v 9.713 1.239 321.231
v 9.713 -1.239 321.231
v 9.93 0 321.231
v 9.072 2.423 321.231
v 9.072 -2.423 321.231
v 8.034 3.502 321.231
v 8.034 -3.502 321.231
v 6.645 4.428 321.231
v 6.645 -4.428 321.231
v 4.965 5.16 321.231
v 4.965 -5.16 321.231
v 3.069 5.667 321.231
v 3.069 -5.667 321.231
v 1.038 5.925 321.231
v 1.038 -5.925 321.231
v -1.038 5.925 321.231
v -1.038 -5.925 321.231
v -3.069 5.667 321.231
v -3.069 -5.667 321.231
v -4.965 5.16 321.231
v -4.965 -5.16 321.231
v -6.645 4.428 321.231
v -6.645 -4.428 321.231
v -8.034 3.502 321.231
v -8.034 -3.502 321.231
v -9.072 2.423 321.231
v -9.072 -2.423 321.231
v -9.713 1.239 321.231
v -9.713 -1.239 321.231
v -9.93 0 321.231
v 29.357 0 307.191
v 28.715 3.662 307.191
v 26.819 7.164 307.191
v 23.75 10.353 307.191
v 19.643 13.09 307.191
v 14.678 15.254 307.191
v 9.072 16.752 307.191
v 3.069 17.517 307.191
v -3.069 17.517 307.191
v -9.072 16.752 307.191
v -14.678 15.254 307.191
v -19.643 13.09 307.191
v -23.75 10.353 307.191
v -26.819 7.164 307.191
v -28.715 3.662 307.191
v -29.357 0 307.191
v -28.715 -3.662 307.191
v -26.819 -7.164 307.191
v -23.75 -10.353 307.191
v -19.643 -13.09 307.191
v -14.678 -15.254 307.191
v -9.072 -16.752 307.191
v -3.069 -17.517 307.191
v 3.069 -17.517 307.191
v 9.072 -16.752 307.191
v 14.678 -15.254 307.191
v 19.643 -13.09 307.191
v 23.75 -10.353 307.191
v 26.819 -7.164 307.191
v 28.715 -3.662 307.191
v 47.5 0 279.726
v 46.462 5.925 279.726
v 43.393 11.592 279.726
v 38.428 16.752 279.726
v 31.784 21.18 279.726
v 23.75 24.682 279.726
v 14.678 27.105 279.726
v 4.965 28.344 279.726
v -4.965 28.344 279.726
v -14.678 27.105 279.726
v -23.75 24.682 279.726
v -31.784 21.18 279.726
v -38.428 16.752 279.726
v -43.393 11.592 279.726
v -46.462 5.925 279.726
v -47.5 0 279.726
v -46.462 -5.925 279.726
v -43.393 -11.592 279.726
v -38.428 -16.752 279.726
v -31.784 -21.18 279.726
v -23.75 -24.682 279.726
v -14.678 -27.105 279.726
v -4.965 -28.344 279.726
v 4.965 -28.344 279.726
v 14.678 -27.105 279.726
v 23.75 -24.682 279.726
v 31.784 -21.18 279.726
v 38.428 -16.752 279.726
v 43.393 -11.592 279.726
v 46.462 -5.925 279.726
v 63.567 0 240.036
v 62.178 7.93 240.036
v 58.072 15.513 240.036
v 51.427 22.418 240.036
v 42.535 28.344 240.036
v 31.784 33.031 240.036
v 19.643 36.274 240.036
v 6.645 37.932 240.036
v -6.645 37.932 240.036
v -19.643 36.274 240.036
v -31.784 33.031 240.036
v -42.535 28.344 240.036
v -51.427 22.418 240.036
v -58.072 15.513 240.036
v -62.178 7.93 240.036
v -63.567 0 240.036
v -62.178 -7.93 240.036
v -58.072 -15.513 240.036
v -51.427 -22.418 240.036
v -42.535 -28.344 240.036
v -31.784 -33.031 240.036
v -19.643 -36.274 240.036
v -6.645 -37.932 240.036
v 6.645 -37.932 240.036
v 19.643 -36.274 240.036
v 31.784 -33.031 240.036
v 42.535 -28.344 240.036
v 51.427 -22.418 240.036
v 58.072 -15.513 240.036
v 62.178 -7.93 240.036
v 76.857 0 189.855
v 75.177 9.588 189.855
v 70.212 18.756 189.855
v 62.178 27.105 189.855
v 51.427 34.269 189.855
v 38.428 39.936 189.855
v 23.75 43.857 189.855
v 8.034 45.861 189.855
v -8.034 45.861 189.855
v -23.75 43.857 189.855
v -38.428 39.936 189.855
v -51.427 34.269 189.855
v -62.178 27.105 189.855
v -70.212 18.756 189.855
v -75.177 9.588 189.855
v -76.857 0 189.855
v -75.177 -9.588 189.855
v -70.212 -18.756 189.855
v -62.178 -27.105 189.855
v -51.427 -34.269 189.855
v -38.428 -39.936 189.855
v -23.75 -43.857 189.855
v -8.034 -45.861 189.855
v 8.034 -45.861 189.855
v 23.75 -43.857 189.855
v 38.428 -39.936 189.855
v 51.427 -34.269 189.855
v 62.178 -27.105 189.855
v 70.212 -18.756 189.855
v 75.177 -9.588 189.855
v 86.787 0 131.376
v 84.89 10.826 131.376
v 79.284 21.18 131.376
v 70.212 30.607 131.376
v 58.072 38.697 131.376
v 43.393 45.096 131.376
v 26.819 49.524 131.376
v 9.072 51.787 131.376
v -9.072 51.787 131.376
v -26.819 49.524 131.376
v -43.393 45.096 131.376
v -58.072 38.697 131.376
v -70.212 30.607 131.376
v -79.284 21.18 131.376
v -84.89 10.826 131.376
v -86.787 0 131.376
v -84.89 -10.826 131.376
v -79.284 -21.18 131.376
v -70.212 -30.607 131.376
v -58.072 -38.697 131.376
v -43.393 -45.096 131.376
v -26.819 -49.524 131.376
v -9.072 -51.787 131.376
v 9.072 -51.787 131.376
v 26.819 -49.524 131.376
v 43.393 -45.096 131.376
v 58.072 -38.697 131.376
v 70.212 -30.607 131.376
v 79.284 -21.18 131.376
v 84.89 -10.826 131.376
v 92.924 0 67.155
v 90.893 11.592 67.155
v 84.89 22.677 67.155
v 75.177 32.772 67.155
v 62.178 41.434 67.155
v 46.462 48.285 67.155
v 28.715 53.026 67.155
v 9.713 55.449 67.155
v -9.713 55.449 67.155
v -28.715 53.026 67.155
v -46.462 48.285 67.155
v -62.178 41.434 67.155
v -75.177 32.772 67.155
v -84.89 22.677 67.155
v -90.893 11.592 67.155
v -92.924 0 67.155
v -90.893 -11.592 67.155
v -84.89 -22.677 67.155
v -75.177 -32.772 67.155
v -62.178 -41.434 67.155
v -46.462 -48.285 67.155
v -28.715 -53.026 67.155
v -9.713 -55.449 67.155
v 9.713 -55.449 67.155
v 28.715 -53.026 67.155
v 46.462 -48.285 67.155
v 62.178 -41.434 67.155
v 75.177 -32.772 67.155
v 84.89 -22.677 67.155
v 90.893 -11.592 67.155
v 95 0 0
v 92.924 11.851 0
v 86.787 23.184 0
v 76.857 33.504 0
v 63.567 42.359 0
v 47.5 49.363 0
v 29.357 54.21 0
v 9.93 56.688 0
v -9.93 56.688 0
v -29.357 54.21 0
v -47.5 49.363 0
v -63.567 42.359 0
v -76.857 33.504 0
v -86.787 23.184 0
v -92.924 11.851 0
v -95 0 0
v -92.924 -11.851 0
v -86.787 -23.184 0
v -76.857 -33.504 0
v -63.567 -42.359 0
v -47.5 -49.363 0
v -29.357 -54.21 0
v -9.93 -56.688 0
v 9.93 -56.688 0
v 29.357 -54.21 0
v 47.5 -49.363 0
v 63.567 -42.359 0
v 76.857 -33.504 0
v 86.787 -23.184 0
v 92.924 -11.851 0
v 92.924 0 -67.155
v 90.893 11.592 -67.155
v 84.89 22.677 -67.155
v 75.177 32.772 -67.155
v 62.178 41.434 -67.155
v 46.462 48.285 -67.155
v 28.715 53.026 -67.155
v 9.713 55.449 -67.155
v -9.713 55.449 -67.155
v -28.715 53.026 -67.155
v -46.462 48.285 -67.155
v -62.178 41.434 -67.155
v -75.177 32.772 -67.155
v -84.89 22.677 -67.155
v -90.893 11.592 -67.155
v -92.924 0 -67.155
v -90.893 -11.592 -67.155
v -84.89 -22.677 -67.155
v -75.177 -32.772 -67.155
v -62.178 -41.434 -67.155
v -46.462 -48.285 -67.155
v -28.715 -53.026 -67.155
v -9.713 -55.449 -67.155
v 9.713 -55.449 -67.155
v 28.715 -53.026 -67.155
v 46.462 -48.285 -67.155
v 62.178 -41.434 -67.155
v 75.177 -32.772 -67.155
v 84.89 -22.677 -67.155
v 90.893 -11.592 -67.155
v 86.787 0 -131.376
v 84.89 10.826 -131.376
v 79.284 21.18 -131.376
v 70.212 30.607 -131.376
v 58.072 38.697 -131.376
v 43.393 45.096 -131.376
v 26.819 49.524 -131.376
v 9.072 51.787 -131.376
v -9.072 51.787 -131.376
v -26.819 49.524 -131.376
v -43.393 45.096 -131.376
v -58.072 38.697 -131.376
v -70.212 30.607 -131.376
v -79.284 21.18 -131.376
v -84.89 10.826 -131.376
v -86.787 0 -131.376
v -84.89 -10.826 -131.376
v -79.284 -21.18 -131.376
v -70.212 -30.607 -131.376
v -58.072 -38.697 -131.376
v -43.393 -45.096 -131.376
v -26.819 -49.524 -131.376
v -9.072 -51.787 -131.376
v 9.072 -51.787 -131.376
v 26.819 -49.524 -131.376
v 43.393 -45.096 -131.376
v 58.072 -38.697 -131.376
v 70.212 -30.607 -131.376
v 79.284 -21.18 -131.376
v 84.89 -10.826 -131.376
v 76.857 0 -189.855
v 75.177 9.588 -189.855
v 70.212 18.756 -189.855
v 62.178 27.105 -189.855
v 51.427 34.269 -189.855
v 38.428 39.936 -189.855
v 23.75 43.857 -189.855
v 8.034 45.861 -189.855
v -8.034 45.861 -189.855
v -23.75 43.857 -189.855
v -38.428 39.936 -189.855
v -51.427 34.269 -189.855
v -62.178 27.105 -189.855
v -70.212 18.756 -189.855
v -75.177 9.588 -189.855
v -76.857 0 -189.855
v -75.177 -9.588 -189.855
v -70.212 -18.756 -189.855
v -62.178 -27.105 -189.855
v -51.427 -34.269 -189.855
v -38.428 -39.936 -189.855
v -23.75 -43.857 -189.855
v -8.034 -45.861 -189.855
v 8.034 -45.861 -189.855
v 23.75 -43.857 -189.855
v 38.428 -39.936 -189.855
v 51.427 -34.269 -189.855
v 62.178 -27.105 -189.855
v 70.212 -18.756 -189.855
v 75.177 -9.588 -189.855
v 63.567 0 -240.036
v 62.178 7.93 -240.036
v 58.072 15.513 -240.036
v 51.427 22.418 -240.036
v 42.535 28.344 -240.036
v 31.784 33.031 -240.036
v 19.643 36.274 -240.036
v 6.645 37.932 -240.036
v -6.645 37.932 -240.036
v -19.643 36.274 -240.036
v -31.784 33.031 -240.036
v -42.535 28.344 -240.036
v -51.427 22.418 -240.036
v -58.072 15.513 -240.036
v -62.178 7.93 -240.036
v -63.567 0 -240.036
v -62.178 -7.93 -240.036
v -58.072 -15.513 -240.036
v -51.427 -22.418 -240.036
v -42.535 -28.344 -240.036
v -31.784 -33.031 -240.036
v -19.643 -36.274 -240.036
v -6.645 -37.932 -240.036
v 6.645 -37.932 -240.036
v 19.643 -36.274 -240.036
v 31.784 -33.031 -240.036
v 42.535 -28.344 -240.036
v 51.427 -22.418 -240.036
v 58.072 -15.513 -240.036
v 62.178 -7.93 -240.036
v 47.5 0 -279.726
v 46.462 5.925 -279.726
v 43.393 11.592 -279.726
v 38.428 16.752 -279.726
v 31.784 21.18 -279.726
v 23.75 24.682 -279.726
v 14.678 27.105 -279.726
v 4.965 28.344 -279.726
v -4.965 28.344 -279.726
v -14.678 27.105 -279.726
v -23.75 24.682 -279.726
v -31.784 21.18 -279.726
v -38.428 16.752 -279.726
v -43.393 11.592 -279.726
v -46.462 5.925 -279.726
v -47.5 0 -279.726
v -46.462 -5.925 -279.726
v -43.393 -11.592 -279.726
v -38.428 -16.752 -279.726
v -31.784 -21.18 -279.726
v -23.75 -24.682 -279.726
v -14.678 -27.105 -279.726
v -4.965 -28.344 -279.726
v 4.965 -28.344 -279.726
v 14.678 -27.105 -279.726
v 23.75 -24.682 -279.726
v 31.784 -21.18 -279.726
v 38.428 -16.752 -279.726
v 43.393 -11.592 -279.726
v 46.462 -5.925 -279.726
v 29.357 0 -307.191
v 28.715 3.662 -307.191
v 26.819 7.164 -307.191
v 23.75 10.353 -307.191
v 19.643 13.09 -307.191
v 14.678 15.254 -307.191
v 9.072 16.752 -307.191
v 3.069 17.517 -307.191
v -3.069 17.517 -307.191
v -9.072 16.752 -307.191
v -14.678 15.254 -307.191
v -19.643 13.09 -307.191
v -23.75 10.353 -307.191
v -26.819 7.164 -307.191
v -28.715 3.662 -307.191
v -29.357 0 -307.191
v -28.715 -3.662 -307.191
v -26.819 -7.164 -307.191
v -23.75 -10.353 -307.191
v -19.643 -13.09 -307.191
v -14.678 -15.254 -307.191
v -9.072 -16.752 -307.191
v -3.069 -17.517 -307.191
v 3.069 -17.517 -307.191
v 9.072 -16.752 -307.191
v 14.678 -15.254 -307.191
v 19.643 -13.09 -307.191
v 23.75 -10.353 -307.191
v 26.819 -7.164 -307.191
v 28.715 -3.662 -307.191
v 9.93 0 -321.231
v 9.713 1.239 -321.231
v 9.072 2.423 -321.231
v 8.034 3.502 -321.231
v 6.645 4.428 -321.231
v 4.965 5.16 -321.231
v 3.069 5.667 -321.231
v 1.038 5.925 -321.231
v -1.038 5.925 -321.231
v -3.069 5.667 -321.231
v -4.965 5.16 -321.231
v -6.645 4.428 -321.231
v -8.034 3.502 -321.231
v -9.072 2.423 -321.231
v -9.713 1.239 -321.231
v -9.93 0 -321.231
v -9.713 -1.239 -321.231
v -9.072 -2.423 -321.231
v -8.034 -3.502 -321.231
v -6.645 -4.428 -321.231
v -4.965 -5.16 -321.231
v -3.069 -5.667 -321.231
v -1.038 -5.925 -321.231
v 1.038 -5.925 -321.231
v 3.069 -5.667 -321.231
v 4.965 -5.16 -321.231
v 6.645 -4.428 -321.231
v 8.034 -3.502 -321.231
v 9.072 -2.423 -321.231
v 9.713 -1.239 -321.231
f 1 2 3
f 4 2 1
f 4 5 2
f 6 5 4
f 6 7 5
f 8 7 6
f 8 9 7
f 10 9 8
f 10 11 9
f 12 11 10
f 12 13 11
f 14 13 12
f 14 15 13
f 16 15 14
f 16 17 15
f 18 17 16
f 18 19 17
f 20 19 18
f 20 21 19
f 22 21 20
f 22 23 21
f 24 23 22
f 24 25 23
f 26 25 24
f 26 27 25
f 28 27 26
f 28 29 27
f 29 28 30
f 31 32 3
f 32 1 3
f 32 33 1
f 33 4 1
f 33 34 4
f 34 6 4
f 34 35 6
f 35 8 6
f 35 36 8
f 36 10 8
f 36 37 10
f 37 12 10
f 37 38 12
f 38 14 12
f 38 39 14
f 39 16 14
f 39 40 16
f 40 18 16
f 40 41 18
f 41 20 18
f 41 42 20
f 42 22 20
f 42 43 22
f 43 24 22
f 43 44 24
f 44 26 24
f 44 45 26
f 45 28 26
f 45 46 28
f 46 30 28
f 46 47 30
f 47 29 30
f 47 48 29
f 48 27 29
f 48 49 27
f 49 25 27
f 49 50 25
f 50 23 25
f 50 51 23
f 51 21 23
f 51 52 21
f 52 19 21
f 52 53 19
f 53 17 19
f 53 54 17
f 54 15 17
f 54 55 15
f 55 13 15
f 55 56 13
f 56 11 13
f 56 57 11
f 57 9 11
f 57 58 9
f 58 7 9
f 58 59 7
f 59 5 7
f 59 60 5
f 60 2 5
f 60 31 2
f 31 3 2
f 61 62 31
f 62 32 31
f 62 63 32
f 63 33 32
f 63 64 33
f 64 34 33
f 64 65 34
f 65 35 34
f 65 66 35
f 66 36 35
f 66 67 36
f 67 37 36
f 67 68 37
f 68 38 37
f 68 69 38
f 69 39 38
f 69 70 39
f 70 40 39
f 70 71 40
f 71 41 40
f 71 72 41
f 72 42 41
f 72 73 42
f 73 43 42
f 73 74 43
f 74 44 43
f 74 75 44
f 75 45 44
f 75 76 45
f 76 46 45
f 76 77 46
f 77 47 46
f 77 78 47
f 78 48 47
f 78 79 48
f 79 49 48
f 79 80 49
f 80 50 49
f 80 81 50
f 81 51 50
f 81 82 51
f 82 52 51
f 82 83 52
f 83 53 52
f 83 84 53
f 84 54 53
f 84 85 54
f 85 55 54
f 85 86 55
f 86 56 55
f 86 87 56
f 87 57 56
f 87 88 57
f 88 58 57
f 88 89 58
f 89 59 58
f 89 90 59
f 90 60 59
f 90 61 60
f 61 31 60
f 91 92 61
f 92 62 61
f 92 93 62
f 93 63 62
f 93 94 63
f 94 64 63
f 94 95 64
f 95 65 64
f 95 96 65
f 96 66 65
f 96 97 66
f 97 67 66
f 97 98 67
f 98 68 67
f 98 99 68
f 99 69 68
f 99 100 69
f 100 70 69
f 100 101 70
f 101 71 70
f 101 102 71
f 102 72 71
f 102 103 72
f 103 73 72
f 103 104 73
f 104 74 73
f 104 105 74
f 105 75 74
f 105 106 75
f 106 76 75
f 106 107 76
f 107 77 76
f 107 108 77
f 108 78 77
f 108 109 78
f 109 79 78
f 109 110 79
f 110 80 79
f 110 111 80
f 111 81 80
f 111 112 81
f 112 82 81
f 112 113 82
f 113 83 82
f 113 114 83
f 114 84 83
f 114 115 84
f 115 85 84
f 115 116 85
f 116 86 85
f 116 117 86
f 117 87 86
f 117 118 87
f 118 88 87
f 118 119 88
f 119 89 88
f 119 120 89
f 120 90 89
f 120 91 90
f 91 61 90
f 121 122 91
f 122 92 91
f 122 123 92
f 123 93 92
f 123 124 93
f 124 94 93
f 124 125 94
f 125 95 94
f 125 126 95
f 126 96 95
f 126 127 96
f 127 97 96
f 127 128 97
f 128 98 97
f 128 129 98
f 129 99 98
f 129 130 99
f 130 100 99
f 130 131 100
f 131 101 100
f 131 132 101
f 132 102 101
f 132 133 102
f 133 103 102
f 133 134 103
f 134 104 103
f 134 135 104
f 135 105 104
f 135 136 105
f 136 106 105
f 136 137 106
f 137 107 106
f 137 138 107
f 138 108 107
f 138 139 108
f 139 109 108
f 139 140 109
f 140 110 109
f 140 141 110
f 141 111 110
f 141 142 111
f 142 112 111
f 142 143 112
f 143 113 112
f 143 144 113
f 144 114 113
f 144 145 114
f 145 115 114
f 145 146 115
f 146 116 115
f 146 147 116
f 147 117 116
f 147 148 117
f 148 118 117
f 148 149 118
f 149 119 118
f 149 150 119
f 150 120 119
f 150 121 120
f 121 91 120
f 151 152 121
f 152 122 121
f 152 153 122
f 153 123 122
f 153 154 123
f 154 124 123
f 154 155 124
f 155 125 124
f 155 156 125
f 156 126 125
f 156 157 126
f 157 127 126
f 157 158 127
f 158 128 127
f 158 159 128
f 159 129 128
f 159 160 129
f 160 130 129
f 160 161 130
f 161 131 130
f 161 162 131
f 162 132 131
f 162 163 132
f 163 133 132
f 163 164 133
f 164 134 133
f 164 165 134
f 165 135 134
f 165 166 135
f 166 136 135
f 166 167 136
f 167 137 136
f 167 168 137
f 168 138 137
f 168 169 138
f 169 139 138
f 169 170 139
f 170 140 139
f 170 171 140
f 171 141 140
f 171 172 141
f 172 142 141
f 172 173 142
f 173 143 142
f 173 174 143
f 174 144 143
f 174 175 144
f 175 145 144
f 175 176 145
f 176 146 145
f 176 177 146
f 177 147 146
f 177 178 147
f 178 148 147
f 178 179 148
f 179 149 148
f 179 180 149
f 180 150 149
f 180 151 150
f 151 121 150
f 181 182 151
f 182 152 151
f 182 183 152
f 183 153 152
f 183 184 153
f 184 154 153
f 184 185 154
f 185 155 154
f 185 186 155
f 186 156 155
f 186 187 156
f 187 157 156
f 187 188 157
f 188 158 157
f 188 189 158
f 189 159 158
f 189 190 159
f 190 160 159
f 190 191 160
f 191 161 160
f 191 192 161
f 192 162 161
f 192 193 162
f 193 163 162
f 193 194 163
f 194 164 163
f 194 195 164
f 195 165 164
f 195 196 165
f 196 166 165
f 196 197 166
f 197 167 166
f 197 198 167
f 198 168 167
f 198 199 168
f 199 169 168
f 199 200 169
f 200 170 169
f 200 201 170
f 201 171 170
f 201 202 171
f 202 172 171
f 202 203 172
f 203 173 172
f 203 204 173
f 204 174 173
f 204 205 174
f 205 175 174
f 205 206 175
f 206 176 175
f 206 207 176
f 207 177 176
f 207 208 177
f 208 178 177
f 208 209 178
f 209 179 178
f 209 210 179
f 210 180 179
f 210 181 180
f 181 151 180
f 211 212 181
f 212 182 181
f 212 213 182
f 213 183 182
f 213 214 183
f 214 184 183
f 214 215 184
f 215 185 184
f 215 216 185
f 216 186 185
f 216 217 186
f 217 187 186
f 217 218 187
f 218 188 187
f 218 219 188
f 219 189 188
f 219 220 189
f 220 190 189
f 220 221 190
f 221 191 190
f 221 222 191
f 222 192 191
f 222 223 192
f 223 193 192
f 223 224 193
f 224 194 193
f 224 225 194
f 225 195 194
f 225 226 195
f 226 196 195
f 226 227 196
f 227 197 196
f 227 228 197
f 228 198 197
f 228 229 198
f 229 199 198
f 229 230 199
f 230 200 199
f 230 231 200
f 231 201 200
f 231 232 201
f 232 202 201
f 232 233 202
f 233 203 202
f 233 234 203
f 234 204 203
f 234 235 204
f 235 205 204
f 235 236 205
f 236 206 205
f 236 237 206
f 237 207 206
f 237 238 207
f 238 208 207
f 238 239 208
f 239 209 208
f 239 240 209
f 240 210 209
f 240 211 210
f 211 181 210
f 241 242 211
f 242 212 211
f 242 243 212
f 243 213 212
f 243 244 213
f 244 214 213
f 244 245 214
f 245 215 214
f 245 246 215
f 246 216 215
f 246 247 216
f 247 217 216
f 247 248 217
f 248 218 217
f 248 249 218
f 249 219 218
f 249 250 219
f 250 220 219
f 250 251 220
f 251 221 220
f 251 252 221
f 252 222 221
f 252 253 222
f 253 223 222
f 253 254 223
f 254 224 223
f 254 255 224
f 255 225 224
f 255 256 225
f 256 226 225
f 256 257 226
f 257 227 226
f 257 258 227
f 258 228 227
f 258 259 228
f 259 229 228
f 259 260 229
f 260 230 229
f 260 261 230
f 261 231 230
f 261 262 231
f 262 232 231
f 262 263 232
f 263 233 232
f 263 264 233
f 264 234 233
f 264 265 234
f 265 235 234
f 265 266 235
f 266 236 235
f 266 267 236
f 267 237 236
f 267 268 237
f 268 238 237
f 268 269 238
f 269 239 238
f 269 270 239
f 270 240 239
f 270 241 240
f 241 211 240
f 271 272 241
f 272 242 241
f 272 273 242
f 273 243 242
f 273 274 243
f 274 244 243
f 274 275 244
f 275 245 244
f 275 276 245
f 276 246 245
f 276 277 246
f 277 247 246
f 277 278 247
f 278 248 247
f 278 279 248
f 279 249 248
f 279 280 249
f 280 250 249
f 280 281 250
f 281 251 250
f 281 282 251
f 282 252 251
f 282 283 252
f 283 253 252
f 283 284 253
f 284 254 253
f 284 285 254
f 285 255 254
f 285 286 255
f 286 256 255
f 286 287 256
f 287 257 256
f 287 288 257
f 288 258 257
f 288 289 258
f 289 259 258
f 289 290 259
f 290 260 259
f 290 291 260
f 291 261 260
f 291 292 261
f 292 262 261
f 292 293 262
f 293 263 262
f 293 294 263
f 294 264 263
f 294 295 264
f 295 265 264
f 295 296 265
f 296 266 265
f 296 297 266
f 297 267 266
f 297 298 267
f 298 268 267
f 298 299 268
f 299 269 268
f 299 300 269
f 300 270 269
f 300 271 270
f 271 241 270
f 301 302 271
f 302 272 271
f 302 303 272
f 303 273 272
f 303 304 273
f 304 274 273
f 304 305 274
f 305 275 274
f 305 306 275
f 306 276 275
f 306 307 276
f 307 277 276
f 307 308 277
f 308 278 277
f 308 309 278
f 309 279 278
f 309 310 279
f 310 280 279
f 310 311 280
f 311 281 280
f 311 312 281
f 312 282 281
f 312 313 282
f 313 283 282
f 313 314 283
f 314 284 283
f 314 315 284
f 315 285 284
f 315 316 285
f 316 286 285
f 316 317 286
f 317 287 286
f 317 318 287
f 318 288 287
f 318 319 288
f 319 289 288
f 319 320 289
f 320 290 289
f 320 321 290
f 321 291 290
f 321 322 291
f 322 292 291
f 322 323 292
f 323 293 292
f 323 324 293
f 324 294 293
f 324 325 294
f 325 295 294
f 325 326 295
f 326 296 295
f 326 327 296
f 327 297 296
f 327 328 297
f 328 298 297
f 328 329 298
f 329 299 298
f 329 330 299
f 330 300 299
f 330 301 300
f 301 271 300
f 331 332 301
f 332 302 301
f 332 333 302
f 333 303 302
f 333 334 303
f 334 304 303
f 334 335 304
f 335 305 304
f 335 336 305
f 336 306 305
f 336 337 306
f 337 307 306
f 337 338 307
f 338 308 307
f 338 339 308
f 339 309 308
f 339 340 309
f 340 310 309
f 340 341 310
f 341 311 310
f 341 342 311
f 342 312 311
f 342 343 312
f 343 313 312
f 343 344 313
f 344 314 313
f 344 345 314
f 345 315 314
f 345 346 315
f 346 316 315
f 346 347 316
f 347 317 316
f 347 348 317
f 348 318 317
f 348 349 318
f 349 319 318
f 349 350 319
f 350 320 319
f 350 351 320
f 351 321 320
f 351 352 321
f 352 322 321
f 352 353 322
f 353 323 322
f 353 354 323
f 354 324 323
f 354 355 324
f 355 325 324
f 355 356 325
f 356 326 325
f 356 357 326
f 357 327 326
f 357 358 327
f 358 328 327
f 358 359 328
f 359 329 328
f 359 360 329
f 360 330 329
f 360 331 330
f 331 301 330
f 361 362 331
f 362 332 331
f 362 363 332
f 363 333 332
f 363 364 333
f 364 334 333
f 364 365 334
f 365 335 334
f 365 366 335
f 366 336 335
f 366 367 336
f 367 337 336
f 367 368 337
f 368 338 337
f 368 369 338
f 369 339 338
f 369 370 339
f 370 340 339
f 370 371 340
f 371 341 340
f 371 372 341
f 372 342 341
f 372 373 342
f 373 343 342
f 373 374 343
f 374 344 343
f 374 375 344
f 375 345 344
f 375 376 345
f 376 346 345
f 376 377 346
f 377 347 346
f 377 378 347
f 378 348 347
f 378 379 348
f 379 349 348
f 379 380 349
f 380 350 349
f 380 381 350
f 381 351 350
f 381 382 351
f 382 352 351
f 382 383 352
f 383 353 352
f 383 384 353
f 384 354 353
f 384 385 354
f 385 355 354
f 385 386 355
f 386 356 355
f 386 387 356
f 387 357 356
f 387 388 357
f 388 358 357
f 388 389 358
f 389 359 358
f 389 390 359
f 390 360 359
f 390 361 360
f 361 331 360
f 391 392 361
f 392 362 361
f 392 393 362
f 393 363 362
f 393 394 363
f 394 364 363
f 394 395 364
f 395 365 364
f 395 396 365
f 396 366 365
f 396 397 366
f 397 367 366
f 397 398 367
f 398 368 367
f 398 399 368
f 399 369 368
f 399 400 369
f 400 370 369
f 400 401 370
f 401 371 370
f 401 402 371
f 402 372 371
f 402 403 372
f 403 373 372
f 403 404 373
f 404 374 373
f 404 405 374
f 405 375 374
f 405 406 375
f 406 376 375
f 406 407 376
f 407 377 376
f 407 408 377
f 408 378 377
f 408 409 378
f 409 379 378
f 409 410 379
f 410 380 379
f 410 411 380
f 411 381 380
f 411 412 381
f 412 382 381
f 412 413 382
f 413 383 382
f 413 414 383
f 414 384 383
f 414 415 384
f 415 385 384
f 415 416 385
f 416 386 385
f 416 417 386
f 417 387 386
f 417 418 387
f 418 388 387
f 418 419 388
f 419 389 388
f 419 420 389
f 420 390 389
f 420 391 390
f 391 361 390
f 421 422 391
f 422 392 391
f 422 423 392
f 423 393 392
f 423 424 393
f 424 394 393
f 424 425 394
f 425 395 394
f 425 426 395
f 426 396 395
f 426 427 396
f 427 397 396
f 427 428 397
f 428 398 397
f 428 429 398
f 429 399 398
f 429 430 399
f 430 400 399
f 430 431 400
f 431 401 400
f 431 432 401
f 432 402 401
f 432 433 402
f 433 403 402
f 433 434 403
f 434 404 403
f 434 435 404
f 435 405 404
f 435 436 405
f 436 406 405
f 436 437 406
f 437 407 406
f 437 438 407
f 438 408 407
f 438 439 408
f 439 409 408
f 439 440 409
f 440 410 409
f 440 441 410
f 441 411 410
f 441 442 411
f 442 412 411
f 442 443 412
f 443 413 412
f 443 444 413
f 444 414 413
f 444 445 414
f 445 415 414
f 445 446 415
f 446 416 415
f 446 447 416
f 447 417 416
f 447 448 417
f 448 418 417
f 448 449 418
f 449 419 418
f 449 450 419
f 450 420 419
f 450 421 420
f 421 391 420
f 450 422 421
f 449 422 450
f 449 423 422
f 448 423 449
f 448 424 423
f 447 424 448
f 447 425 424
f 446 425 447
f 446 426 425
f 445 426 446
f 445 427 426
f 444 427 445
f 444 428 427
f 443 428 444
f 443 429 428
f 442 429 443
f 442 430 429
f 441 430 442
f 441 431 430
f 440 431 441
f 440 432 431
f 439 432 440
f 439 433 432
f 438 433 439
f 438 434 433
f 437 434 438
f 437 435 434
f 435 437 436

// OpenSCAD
// Generated by SolidPython 1.0.1 on 2020-07-29 00:46:46


scale(v = [5, 3, 17]) {
	sphere(r = 19);
}
/***********************************************
*********      SolidPython code:      **********
************************************************
 
# import packages: SolidPython
from solid import *
from solid.utils import *
from itertools import chain, combinations, permutations


class Resize:

    def __init__(self, scad_file):
        self.scad_file = scad_file
        #self.scad_file = import_scad(scad_file)
        # cone/cylinder param:
        self.r1 = 0
        self.r2 = 0
        self.h = 0
        # rectangular prism param:
        self.w = 0
        self.l = 0
        # ellipse param:
        self.r = 0

    # import OpenScad code (file name corresponds to shape)


    # classify shape + parameters
    def assign(self, param1, param2, param3):
        if self.scad_file == 'cone.scad':
            self.r1 = param1
            self.r2 = param2
            self.h = param3
        elif self.scad_file == 'cylinder.scad':
            self.r1 = param1
            self.r2 = param2
            self.h = param3
        elif self.scad_file == 'rectangularPrism.scad':
            self.h = param1
            self.l = param2
            self.w = param3
        else:
            self.r = param1
            self.h = param2

    # resize parameters
    def iterate(self):
        x = range(3, 20, 2)
        i = 1
        if self.scad_file == 'cone.scad':
            tempList = list(permutations(x, 2))
            for temp in tempList:
                param1 = temp[0]
                param2 = temp[1]
                filepath = 'produced_scad_files/' + 'cone' + str(param1) + '_' + str(param2) + '_' + '.scad'
                scad_render_to_file(cylinder(h=param1, r1=param2, r2=0), filepath)

        elif self.scad_file == 'cylinder.scad':
            tempList = list(permutations(x, 3))
            for temp in tempList:
                param1 = temp[0]
                param2 = temp[1]
                filepath = 'produced_scad_files/' + 'cylinder' + str(param1) + '_' + str(param2) + '_' + '.scad'
                scad_render_to_file(cylinder(h=param1, r1=param2, r2=param2), filepath)

        elif self.scad_file == 'rectangularPrism.scad':
            tempList = list(permutations(x, 3))
            for temp in tempList:
                param1 = temp[0]
                param2 = temp[1]
                param3 = temp[2]
                filepath = 'produced_scad_files/' + 'rectangularPrism' + str(param1) + '_' + str(param2) + '_' + str(
                    param3) + '.scad'
                scad_render_to_file(cube(size=(param1, param2, param3)), filepath)

        elif self.scad_file == 'ellipse.scad':
            tempList = list(permutations(x, 4))
            for temp in tempList:
                param1 = temp[0]
                param2 = temp[1]
                param3 = temp[2]
                param4 = temp[3]
                filepath = 'produced_scad_files/' + 'ellipse' + str(param1) + '_' + str(param2) + '_' + str(param3) + '_' + str(param4) + '.scad'
                scad_render_to_file(scale([param1, param2, param3])(sphere(r=param4)), filepath)

    def render_to_scadfile(self):
        scad_render_to_file(scad, 'example.scad') 
 
************************************************/
